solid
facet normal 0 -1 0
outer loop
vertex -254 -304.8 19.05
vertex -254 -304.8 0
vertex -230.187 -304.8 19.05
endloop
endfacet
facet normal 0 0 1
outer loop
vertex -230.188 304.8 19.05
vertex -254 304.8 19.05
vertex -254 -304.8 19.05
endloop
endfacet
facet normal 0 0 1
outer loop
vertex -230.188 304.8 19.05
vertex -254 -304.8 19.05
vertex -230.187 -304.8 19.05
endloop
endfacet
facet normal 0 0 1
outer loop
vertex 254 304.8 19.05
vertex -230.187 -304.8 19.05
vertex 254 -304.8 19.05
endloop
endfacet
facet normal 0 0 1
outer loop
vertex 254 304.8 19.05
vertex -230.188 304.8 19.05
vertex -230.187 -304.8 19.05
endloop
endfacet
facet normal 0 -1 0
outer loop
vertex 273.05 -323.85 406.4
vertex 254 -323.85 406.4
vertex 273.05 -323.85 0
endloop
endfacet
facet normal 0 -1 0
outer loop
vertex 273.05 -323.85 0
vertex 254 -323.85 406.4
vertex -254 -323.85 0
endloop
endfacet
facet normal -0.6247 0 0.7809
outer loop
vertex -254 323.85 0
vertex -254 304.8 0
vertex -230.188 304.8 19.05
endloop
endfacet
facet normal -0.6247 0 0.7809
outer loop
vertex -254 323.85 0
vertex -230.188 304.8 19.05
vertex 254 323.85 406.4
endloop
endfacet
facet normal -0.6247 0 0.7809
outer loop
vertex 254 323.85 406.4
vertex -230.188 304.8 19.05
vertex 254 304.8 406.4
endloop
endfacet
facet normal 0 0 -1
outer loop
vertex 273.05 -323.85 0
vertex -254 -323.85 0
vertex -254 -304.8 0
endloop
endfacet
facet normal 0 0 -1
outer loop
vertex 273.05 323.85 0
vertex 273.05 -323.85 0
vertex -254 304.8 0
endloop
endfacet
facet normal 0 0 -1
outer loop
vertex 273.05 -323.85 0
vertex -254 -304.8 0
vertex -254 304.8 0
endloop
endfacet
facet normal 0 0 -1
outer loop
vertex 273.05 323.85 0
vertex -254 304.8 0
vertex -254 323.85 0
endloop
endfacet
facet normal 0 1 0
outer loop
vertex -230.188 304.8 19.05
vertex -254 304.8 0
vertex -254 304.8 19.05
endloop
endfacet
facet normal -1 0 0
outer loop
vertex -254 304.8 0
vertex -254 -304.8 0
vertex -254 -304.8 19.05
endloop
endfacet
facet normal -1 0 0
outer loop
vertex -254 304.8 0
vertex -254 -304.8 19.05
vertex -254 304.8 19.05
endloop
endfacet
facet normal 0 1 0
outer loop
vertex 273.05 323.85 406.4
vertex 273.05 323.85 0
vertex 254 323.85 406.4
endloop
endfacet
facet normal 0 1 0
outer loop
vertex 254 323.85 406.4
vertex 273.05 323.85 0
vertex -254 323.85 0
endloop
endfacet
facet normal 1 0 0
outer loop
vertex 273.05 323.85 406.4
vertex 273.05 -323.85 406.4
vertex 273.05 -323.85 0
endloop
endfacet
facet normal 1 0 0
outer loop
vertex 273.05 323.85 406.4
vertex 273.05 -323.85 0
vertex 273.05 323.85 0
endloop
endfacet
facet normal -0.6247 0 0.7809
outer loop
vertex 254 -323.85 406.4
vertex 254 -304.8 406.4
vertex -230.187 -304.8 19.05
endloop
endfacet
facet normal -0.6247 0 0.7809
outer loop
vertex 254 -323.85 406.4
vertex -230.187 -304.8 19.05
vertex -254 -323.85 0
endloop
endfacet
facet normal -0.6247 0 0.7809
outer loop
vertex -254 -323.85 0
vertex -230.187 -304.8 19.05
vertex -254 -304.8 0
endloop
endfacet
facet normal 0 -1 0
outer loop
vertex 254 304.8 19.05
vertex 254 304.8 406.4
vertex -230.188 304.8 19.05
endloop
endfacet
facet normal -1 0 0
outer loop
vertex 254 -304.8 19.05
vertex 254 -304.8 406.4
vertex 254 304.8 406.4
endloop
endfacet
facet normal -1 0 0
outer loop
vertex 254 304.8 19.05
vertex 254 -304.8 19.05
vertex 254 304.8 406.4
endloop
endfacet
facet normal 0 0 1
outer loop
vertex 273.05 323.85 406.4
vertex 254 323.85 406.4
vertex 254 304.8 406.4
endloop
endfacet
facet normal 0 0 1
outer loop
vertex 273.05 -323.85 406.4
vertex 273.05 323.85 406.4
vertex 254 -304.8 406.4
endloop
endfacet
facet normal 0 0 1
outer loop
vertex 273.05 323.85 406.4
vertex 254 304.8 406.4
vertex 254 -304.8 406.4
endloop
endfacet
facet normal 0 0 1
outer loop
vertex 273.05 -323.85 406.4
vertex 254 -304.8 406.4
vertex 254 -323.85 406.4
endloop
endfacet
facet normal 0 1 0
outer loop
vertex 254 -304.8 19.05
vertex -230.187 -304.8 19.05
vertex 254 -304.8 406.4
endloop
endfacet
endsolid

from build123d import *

# Parameters (mm, degrees)
F0_W     = 508
F0_H     = 609.6
F1_DEPTH = 19.05
F3_DEPTH = 19.05
F5_DEPTH = 19.05
F6_W     = 609.6
F6_H     = 387.35
F7_DEPTH = 19.05


with BuildPart() as f1:
    # F0 (on Top) → F1 (new body)
    with BuildSketch(Plane.XY):
        Rectangle(F0_W, F0_H)
    extrude(amount=F1_DEPTH)

    # F2 (on face) → F3 (join)
    with BuildSketch(Plane.XZ.offset(304.8)):
        Polygon((-230.1875, 19.05), (254, 19.05), (254, 406.4), align=None)
        Polygon((-254, 0), (254, 0), (254, 19.05), (-230.1875, 19.05), align=None)
    extrude(amount=F3_DEPTH)

    # F4 (on face) → F5 (join)
    with BuildSketch(Plane(origin=(0, 304.8, 0), x_dir=(-1, 0, 0), z_dir=(0, 1, 0))):
        Polygon((-254, 406.4), (-254, 19.05), (230.1875, 19.05), align=None)
        Polygon((-254, 19.05), (-254, 0), (254, 0), (230.1875, 19.05), align=None)
    extrude(amount=F5_DEPTH)

    # F6 (on face) → F7 (join)
    with BuildSketch(Plane.YZ.offset(254)):
        with Locations((0, 212.725)):
            Rectangle(F6_W, F6_H)
        Polygon((-323.85, 0), (323.85, 0), (323.85, 406.4), (304.8, 406.4), (304.8, 19.05), (-304.8, 19.05), (-304.8, 406.4), (-323.85, 406.4), align=None)
    extrude(amount=F7_DEPTH)


solid = f1.part
